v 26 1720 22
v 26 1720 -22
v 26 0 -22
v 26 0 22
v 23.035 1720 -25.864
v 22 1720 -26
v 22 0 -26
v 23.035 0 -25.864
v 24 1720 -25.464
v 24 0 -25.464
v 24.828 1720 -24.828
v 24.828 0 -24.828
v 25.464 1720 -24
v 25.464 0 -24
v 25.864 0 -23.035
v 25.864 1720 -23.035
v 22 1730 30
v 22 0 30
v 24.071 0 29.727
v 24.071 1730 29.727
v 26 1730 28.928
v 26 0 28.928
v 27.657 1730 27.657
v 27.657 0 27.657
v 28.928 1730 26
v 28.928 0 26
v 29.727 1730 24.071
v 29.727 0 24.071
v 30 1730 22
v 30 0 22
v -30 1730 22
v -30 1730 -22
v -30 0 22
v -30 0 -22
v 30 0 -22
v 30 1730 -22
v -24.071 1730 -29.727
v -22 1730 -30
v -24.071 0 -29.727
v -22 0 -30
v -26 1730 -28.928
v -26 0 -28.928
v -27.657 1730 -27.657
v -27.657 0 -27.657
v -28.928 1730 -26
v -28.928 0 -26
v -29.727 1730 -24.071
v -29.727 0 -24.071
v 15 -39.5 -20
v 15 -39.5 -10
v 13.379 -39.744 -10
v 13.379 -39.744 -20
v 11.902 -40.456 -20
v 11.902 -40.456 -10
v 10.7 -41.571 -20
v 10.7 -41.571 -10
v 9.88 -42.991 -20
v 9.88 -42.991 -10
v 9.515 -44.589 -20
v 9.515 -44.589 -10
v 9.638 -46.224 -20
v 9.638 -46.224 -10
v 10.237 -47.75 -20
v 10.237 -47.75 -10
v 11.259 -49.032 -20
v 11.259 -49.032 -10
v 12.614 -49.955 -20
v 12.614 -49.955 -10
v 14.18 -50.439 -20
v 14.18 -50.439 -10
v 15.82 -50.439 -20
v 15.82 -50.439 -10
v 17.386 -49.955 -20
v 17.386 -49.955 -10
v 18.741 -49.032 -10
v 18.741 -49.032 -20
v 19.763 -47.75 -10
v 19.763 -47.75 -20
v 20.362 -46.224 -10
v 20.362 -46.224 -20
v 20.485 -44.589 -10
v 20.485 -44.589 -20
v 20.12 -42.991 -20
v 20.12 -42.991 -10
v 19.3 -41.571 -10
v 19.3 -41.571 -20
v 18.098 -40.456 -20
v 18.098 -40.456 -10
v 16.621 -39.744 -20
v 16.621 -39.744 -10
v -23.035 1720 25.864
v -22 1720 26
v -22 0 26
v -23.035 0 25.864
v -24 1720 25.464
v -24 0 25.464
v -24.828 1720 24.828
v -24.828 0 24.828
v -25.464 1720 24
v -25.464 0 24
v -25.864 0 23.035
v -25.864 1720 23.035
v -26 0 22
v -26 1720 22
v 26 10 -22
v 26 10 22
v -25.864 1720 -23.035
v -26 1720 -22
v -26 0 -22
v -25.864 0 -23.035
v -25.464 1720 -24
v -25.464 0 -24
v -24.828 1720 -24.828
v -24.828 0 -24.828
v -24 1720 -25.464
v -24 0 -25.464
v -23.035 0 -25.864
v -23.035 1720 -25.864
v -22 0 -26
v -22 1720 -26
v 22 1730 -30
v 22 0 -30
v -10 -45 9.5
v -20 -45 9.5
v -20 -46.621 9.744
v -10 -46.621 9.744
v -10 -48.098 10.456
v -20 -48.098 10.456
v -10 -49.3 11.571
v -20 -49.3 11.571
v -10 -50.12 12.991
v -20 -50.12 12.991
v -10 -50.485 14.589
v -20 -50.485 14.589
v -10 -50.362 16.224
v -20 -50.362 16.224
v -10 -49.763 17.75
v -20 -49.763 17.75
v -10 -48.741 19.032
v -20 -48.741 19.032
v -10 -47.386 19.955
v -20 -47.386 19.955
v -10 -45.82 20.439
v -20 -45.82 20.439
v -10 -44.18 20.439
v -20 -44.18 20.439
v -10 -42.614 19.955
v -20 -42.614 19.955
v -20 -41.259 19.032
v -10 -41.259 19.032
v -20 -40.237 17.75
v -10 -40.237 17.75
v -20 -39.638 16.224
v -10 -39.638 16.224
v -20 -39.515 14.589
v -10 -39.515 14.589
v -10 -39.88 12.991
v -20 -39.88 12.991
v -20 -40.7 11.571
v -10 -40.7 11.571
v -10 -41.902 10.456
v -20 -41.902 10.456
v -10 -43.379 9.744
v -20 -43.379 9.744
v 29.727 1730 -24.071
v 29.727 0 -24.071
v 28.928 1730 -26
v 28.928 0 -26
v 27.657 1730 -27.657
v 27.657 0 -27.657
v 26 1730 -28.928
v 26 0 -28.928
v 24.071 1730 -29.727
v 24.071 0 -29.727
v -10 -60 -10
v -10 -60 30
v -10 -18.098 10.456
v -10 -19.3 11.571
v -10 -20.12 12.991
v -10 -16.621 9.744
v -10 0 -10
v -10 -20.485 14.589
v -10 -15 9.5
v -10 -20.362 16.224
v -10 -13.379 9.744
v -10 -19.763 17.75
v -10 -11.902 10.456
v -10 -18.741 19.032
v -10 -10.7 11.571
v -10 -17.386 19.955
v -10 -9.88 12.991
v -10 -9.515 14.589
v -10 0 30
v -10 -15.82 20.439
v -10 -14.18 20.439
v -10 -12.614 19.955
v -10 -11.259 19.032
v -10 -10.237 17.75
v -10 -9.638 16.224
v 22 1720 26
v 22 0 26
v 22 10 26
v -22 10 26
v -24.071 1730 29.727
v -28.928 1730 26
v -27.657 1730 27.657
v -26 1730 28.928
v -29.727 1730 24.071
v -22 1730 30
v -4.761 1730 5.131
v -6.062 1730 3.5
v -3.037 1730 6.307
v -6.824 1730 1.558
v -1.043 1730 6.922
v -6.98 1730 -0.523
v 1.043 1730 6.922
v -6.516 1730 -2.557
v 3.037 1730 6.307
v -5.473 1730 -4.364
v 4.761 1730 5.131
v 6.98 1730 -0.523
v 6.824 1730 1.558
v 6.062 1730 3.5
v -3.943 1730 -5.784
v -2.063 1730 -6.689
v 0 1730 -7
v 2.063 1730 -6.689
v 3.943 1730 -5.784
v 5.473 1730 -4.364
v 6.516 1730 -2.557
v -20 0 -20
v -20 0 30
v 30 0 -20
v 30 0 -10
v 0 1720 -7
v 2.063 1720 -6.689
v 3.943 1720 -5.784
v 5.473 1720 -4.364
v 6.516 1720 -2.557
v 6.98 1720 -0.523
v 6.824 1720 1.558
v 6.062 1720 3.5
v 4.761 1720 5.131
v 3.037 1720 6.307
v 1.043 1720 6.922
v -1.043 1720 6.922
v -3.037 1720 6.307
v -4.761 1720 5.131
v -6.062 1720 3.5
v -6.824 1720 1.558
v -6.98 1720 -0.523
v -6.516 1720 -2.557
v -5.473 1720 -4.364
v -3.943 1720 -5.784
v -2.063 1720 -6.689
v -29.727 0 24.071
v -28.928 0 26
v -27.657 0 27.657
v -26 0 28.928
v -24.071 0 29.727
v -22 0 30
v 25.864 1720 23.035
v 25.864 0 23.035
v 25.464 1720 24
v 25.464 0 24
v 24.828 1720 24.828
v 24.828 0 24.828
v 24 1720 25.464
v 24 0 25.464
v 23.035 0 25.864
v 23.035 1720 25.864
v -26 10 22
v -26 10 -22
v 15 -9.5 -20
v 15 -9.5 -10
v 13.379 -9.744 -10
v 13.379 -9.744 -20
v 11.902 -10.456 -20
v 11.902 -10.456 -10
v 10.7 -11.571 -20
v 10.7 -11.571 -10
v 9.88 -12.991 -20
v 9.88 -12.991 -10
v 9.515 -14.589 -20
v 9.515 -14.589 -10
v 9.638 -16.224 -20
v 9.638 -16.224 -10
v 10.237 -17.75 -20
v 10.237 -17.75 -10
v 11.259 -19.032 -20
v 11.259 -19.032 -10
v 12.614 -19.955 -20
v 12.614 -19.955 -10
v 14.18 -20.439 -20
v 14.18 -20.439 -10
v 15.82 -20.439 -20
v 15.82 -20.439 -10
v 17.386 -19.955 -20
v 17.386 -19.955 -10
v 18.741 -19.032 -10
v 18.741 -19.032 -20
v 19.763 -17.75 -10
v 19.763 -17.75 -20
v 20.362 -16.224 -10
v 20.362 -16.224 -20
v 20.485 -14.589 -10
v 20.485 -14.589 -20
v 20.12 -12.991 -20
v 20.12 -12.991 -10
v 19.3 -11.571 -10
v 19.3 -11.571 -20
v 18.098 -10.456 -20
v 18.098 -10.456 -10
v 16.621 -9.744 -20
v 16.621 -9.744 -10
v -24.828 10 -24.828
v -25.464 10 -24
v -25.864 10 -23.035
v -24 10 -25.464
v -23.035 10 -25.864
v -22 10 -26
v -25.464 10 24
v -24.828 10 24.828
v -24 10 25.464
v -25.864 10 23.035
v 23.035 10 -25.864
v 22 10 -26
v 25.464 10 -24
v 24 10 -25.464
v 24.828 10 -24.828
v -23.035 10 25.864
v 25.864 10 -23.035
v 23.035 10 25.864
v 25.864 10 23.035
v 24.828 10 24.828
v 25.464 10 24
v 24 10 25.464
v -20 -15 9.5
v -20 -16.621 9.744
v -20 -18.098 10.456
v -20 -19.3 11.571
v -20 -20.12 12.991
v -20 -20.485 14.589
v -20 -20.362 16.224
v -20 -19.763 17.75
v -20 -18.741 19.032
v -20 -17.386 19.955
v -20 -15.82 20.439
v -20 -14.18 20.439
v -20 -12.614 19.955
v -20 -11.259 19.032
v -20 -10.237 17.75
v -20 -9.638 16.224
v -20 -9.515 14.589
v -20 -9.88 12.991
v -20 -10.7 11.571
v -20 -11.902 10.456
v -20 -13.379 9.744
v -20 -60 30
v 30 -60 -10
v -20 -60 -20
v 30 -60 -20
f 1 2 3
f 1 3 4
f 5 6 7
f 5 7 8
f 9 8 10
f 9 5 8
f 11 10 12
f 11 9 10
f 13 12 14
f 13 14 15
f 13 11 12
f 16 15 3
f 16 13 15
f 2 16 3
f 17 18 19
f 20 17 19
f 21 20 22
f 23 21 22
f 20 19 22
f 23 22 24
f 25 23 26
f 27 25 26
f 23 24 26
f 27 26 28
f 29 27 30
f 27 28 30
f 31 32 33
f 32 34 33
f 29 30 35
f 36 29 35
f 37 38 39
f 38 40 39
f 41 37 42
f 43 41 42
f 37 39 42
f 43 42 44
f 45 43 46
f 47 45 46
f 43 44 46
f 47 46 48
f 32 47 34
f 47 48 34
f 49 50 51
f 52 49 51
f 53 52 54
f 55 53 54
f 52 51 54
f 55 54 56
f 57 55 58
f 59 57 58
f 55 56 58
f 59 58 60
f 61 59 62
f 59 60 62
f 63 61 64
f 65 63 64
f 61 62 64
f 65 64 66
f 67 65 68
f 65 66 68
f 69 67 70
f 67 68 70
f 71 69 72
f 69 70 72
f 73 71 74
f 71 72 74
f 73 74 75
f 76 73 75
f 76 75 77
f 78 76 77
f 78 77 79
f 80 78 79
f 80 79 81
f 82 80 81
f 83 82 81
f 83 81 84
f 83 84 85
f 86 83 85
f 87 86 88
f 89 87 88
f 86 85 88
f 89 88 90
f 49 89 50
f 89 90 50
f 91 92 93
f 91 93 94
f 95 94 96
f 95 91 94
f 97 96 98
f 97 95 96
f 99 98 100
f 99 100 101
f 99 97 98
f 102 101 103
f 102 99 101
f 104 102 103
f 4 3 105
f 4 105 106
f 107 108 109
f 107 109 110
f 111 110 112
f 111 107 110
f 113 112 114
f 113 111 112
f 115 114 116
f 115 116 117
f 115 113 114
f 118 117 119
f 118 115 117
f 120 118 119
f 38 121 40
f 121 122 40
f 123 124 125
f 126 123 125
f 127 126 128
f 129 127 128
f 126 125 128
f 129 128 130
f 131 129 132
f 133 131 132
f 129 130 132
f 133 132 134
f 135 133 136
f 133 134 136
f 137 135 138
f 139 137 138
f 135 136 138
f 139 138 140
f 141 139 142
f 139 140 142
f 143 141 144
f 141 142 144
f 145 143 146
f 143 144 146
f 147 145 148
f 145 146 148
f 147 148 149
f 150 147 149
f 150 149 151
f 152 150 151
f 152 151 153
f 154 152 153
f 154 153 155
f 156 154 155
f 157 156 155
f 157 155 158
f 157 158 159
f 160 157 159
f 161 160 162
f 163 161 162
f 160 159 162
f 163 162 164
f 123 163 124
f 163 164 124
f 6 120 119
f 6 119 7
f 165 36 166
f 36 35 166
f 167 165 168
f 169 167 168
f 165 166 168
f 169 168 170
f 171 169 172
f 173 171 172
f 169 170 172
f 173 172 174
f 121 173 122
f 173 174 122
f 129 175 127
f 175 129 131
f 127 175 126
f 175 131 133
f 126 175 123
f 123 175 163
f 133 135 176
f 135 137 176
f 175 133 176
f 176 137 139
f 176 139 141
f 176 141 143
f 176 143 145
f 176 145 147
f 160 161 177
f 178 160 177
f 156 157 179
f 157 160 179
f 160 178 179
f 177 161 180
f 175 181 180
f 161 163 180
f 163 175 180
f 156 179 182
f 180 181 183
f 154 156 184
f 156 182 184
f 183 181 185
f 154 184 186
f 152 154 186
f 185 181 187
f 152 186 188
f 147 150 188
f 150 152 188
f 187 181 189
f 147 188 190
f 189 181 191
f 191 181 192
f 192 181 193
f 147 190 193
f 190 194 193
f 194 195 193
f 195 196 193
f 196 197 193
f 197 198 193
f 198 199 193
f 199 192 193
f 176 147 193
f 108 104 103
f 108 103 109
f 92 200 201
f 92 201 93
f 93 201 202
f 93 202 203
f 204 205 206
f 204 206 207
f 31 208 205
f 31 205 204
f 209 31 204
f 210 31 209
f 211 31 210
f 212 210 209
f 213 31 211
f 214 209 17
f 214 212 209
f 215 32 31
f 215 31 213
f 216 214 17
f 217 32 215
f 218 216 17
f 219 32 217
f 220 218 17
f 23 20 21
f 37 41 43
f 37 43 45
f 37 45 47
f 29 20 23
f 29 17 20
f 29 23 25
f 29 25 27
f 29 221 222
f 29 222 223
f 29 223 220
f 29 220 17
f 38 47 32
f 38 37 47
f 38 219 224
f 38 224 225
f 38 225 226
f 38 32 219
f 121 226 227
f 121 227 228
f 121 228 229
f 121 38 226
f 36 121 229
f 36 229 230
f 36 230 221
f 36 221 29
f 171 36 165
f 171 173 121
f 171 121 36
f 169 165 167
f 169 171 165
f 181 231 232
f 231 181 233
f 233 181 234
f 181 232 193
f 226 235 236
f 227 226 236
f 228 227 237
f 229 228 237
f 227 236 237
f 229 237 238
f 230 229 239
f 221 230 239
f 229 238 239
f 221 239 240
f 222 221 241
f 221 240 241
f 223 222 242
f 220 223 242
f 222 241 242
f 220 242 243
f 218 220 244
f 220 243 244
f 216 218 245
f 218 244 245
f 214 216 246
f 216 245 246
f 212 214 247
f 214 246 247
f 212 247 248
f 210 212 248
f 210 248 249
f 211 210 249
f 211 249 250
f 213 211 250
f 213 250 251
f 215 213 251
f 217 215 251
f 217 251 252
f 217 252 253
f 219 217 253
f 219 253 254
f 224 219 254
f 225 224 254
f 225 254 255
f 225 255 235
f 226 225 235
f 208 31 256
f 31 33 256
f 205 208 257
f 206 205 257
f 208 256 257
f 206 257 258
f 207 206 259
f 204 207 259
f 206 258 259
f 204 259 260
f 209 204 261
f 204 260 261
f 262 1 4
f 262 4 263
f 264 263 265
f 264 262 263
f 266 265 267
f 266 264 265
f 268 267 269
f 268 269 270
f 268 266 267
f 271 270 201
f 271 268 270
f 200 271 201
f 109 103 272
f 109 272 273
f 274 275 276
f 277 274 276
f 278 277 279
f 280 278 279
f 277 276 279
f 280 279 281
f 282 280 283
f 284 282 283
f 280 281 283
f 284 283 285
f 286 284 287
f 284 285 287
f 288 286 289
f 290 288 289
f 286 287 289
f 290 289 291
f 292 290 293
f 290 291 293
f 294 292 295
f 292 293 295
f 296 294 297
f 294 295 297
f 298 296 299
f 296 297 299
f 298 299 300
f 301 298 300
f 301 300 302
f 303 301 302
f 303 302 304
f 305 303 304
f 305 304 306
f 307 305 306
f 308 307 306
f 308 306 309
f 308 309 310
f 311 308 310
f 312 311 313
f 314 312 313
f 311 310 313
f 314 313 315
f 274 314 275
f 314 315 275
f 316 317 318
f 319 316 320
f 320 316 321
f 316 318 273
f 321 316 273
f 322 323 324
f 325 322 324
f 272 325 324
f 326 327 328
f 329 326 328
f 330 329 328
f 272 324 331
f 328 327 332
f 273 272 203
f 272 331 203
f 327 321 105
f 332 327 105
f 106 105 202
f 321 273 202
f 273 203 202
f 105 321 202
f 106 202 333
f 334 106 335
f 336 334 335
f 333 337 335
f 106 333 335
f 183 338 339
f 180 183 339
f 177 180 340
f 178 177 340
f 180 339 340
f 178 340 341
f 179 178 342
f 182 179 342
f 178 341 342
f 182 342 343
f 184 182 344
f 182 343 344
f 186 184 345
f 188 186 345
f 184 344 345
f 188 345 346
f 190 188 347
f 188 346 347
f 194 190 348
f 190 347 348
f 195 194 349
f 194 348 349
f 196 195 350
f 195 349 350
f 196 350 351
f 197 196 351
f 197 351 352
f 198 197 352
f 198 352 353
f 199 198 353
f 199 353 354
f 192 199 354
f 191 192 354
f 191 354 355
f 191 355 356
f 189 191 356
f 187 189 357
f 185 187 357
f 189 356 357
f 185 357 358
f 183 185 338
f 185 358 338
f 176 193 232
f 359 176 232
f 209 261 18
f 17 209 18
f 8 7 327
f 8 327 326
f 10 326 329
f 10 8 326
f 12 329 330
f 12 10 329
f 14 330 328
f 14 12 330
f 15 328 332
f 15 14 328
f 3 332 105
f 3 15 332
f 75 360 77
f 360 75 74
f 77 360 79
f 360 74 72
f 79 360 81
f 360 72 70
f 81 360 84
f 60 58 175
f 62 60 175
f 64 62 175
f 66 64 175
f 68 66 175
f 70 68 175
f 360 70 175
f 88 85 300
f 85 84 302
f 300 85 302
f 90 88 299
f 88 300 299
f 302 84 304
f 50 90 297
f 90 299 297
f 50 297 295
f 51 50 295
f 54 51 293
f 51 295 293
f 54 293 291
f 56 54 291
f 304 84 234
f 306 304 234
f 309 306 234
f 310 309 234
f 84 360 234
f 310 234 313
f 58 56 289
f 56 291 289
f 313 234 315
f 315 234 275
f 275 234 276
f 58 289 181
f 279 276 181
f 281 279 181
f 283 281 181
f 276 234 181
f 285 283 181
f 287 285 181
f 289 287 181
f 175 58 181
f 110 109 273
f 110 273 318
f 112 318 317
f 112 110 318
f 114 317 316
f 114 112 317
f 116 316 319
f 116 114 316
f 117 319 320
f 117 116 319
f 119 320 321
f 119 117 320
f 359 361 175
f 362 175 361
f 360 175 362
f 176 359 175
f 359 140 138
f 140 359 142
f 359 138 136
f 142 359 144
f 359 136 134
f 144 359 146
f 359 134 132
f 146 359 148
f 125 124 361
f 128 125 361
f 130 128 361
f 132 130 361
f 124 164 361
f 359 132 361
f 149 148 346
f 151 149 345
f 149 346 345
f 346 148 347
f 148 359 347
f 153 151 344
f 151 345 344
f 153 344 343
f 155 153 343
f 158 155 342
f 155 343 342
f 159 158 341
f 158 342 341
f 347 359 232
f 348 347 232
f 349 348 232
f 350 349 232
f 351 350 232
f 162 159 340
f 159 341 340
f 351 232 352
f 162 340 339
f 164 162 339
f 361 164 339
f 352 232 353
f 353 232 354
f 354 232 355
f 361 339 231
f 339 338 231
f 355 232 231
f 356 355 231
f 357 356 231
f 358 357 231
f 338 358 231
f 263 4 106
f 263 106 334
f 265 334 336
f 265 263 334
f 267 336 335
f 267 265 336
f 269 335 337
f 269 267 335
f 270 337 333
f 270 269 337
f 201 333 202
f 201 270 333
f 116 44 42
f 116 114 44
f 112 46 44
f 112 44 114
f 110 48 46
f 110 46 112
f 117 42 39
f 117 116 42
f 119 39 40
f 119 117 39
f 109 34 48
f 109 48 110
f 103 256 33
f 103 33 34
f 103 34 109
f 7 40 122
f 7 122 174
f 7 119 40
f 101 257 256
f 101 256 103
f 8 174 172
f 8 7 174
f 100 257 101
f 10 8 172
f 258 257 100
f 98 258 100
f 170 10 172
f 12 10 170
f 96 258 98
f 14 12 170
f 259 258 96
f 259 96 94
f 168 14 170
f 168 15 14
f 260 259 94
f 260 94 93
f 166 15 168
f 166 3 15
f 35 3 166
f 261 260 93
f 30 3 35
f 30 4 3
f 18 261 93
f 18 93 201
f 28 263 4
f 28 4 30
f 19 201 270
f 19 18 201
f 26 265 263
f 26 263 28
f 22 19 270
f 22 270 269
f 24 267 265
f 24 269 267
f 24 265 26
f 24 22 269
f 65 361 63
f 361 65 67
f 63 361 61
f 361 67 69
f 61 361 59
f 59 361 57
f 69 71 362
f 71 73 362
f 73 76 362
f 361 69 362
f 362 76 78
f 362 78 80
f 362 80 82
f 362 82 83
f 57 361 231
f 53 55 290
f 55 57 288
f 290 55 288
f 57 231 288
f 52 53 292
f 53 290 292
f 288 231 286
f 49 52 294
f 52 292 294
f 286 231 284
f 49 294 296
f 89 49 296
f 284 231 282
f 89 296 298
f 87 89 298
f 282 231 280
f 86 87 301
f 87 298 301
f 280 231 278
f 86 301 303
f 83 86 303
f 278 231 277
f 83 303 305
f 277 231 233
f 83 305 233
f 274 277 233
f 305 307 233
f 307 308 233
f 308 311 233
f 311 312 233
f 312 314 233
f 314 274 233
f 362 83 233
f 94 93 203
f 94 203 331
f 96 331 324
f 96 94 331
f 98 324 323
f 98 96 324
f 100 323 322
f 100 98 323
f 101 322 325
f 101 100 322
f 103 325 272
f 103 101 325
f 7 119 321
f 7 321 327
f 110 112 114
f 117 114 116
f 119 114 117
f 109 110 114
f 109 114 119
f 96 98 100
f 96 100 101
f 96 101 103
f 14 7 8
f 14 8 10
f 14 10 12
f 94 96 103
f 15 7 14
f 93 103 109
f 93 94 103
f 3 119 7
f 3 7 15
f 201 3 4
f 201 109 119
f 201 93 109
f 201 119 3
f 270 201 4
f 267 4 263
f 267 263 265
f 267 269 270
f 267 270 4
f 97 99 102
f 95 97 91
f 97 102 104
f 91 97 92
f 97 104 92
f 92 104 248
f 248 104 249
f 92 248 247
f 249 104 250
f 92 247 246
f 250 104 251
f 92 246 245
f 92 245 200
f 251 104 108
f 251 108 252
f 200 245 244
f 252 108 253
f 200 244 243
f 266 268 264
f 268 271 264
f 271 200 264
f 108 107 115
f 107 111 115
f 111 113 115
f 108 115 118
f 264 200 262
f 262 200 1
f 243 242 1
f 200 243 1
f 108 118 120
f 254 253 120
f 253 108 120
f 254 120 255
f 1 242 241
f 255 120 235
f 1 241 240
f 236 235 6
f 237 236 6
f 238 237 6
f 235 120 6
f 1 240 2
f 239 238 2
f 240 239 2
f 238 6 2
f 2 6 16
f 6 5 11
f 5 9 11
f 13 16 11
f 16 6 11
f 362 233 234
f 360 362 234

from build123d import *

# Parameters (mm, degrees)
F_60_X_60_X_4_0_1_DEPTH          = 1720
EXTRUDE_1_DEPTH                  = 10
HOLE_WIZARD_M16_1_D              = 14
EXTRUDE_4_DEPTH                  = 10
EXTRUDE_5_DEPTH                  = 60
SKETCH_22_W                      = 5.5
SKETCH_22_H                      = 50
HOLE_WIZARD_11_0_11_1_AT_2_COUNT = 2
HOLE_WIZARD_11_0_11_1_AT_2_PITCH = 30
SKETCH_24_W                      = 5.5
SKETCH_24_H                      = 20
HOLE_WIZARD_11_0_11_2_AT_2_COUNT = 2
HOLE_WIZARD_11_0_11_2_AT_2_PITCH = 30


with BuildPart() as part:
    # Sketch1 → 方管 60 X 60 X 4.0(1) (new body)
    with BuildSketch(Plane.XZ.offset(-1720)):
        with BuildLine():
            Line((-22, -30), (22, -30))
            ThreePointArc((22, -30), (27.656854249, -27.656854249), (30, -22))
            Line((30, -22), (30, 22))
            ThreePointArc((30, 22), (27.656854249, 27.656854249), (22, 30))
            Line((22, 30), (-22, 30))
            ThreePointArc((-22, 30), (-27.656854249, 27.656854249), (-30, 22))
            Line((-30, 22), (-30, -22))
            ThreePointArc((-30, -22), (-27.656854249, -27.656854249), (-22, -30))
        make_face()
        with BuildLine():
            Line((-22, -26), (22, -26))
            ThreePointArc((22, -26), (24.828427125, -24.828427125), (26, -22))
            Line((26, -22), (26, 22))
            ThreePointArc((26, 22), (24.828427125, 24.828427125), (22, 26))
            Line((22, 26), (-22, 26))
            ThreePointArc((-22, 26), (-24.828427125, 24.828427125), (-26, 22))
            Line((-26, 22), (-26, -22))
            ThreePointArc((-26, -22), (-24.828427125, -24.828427125), (-22, -26))
        make_face(mode=Mode.SUBTRACT)
    extrude(amount=F_60_X_60_X_4_0_1_DEPTH)

    # 草图4 → 凸台-拉伸1 (add)
    with BuildSketch(Plane(origin=(0, 1720, 0), x_dir=(1, 0, 0), z_dir=(0, 1, 0))):
        with BuildLine():
            Line((30, -22), (30, 22))
            ThreePointArc((30, 22), (27.656854249, 27.656854249), (22, 30))
            Line((22, 30), (-22, 30))
            ThreePointArc((-22, 30), (-27.656854249, 27.656854249), (-30, 22))
            Line((-30, 22), (-30, -22))
            ThreePointArc((-30, -22), (-27.656854249, -27.656854249), (-22, -30))
            Line((-22, -30), (22, -30))
            ThreePointArc((22, -30), (27.656854249, -27.656854249), (30, -22))
        make_face()
    extrude(amount=EXTRUDE_1_DEPTH)

    # M16 螺纹孔1 (through all)
    with Locations(Plane.ZX.offset(1730)):
        with Locations((0, 0)):
            Hole(HOLE_WIZARD_M16_1_D / 2)


with BuildPart() as body_2:
    # 草图15 → 凸台-拉伸4 (new body)
    with BuildSketch(Plane.XZ):
        with BuildLine():
            Line((-26, 22), (-26, -22))
            ThreePointArc((-26, -22), (-24.828427125, -24.828427125), (-22, -26))
            Line((-22, -26), (22, -26))
            ThreePointArc((22, -26), (24.828427125, -24.828427125), (26, -22))
            Line((26, -22), (26, 22))
            ThreePointArc((26, 22), (24.828427125, 24.828427125), (22, 26))
            Line((22, 26), (-22, 26))
            ThreePointArc((-22, 26), (-24.828427125, 24.828427125), (-26, 22))
        make_face()
    extrude(amount=-EXTRUDE_4_DEPTH)


with BuildPart() as body_3:
    # 草图19 → 凸台-拉伸5 (new body)
    with BuildSketch(Plane.XZ):
        Polygon((-20, 30), (-20, -20), (30, -20), (30, -10), (-10, -10), (-10, 30), align=None)
    extrude(amount=EXTRUDE_5_DEPTH)

    # 草图22 → Ø11.0 (11) 直径孔1 (revolve, cut)
    with BuildSketch(Plane(origin=(15, -15, -20), x_dir=(0, 1, 0), z_dir=(1, 0, 0))):
        with Locations((2.75, 25)):
            Rectangle(SKETCH_22_W, SKETCH_22_H)
    hole_wizard_11_0_11_1 = revolve(axis=Axis((15, -15, -26.35), (0, 0, 1)), mode=Mode.SUBTRACT)

    # Ø11.0 (11) 直径孔1 at 2: Ø11.0 (11) 直径孔1 ×2
    with Locations(*[(0, -i * HOLE_WIZARD_11_0_11_1_AT_2_PITCH, 0) for i in range(1, HOLE_WIZARD_11_0_11_1_AT_2_COUNT)]):
        add(hole_wizard_11_0_11_1, mode=Mode.SUBTRACT)

    # 草图24 → Ø11.0 (11) 直径孔2 (revolve, cut)
    with BuildSketch(Plane(origin=(-10, -45, 15), x_dir=(0, 0, -1), z_dir=(0, 1, 0))):
        with Locations((2.75, 10)):
            Rectangle(SKETCH_24_W, SKETCH_24_H)
    hole_wizard_11_0_11_2 = revolve(axis=Axis((-3.65, -45, 15), (-1, 0, 0)), mode=Mode.SUBTRACT)

    # Ø11.0 (11) 直径孔2 at 2: Ø11.0 (11) 直径孔2 ×2
    with Locations(*[(0, i * HOLE_WIZARD_11_0_11_2_AT_2_PITCH, 0) for i in range(1, HOLE_WIZARD_11_0_11_2_AT_2_COUNT)]):
        add(hole_wizard_11_0_11_2, mode=Mode.SUBTRACT)


solid = Compound([part.part, body_2.part, body_3.part])
